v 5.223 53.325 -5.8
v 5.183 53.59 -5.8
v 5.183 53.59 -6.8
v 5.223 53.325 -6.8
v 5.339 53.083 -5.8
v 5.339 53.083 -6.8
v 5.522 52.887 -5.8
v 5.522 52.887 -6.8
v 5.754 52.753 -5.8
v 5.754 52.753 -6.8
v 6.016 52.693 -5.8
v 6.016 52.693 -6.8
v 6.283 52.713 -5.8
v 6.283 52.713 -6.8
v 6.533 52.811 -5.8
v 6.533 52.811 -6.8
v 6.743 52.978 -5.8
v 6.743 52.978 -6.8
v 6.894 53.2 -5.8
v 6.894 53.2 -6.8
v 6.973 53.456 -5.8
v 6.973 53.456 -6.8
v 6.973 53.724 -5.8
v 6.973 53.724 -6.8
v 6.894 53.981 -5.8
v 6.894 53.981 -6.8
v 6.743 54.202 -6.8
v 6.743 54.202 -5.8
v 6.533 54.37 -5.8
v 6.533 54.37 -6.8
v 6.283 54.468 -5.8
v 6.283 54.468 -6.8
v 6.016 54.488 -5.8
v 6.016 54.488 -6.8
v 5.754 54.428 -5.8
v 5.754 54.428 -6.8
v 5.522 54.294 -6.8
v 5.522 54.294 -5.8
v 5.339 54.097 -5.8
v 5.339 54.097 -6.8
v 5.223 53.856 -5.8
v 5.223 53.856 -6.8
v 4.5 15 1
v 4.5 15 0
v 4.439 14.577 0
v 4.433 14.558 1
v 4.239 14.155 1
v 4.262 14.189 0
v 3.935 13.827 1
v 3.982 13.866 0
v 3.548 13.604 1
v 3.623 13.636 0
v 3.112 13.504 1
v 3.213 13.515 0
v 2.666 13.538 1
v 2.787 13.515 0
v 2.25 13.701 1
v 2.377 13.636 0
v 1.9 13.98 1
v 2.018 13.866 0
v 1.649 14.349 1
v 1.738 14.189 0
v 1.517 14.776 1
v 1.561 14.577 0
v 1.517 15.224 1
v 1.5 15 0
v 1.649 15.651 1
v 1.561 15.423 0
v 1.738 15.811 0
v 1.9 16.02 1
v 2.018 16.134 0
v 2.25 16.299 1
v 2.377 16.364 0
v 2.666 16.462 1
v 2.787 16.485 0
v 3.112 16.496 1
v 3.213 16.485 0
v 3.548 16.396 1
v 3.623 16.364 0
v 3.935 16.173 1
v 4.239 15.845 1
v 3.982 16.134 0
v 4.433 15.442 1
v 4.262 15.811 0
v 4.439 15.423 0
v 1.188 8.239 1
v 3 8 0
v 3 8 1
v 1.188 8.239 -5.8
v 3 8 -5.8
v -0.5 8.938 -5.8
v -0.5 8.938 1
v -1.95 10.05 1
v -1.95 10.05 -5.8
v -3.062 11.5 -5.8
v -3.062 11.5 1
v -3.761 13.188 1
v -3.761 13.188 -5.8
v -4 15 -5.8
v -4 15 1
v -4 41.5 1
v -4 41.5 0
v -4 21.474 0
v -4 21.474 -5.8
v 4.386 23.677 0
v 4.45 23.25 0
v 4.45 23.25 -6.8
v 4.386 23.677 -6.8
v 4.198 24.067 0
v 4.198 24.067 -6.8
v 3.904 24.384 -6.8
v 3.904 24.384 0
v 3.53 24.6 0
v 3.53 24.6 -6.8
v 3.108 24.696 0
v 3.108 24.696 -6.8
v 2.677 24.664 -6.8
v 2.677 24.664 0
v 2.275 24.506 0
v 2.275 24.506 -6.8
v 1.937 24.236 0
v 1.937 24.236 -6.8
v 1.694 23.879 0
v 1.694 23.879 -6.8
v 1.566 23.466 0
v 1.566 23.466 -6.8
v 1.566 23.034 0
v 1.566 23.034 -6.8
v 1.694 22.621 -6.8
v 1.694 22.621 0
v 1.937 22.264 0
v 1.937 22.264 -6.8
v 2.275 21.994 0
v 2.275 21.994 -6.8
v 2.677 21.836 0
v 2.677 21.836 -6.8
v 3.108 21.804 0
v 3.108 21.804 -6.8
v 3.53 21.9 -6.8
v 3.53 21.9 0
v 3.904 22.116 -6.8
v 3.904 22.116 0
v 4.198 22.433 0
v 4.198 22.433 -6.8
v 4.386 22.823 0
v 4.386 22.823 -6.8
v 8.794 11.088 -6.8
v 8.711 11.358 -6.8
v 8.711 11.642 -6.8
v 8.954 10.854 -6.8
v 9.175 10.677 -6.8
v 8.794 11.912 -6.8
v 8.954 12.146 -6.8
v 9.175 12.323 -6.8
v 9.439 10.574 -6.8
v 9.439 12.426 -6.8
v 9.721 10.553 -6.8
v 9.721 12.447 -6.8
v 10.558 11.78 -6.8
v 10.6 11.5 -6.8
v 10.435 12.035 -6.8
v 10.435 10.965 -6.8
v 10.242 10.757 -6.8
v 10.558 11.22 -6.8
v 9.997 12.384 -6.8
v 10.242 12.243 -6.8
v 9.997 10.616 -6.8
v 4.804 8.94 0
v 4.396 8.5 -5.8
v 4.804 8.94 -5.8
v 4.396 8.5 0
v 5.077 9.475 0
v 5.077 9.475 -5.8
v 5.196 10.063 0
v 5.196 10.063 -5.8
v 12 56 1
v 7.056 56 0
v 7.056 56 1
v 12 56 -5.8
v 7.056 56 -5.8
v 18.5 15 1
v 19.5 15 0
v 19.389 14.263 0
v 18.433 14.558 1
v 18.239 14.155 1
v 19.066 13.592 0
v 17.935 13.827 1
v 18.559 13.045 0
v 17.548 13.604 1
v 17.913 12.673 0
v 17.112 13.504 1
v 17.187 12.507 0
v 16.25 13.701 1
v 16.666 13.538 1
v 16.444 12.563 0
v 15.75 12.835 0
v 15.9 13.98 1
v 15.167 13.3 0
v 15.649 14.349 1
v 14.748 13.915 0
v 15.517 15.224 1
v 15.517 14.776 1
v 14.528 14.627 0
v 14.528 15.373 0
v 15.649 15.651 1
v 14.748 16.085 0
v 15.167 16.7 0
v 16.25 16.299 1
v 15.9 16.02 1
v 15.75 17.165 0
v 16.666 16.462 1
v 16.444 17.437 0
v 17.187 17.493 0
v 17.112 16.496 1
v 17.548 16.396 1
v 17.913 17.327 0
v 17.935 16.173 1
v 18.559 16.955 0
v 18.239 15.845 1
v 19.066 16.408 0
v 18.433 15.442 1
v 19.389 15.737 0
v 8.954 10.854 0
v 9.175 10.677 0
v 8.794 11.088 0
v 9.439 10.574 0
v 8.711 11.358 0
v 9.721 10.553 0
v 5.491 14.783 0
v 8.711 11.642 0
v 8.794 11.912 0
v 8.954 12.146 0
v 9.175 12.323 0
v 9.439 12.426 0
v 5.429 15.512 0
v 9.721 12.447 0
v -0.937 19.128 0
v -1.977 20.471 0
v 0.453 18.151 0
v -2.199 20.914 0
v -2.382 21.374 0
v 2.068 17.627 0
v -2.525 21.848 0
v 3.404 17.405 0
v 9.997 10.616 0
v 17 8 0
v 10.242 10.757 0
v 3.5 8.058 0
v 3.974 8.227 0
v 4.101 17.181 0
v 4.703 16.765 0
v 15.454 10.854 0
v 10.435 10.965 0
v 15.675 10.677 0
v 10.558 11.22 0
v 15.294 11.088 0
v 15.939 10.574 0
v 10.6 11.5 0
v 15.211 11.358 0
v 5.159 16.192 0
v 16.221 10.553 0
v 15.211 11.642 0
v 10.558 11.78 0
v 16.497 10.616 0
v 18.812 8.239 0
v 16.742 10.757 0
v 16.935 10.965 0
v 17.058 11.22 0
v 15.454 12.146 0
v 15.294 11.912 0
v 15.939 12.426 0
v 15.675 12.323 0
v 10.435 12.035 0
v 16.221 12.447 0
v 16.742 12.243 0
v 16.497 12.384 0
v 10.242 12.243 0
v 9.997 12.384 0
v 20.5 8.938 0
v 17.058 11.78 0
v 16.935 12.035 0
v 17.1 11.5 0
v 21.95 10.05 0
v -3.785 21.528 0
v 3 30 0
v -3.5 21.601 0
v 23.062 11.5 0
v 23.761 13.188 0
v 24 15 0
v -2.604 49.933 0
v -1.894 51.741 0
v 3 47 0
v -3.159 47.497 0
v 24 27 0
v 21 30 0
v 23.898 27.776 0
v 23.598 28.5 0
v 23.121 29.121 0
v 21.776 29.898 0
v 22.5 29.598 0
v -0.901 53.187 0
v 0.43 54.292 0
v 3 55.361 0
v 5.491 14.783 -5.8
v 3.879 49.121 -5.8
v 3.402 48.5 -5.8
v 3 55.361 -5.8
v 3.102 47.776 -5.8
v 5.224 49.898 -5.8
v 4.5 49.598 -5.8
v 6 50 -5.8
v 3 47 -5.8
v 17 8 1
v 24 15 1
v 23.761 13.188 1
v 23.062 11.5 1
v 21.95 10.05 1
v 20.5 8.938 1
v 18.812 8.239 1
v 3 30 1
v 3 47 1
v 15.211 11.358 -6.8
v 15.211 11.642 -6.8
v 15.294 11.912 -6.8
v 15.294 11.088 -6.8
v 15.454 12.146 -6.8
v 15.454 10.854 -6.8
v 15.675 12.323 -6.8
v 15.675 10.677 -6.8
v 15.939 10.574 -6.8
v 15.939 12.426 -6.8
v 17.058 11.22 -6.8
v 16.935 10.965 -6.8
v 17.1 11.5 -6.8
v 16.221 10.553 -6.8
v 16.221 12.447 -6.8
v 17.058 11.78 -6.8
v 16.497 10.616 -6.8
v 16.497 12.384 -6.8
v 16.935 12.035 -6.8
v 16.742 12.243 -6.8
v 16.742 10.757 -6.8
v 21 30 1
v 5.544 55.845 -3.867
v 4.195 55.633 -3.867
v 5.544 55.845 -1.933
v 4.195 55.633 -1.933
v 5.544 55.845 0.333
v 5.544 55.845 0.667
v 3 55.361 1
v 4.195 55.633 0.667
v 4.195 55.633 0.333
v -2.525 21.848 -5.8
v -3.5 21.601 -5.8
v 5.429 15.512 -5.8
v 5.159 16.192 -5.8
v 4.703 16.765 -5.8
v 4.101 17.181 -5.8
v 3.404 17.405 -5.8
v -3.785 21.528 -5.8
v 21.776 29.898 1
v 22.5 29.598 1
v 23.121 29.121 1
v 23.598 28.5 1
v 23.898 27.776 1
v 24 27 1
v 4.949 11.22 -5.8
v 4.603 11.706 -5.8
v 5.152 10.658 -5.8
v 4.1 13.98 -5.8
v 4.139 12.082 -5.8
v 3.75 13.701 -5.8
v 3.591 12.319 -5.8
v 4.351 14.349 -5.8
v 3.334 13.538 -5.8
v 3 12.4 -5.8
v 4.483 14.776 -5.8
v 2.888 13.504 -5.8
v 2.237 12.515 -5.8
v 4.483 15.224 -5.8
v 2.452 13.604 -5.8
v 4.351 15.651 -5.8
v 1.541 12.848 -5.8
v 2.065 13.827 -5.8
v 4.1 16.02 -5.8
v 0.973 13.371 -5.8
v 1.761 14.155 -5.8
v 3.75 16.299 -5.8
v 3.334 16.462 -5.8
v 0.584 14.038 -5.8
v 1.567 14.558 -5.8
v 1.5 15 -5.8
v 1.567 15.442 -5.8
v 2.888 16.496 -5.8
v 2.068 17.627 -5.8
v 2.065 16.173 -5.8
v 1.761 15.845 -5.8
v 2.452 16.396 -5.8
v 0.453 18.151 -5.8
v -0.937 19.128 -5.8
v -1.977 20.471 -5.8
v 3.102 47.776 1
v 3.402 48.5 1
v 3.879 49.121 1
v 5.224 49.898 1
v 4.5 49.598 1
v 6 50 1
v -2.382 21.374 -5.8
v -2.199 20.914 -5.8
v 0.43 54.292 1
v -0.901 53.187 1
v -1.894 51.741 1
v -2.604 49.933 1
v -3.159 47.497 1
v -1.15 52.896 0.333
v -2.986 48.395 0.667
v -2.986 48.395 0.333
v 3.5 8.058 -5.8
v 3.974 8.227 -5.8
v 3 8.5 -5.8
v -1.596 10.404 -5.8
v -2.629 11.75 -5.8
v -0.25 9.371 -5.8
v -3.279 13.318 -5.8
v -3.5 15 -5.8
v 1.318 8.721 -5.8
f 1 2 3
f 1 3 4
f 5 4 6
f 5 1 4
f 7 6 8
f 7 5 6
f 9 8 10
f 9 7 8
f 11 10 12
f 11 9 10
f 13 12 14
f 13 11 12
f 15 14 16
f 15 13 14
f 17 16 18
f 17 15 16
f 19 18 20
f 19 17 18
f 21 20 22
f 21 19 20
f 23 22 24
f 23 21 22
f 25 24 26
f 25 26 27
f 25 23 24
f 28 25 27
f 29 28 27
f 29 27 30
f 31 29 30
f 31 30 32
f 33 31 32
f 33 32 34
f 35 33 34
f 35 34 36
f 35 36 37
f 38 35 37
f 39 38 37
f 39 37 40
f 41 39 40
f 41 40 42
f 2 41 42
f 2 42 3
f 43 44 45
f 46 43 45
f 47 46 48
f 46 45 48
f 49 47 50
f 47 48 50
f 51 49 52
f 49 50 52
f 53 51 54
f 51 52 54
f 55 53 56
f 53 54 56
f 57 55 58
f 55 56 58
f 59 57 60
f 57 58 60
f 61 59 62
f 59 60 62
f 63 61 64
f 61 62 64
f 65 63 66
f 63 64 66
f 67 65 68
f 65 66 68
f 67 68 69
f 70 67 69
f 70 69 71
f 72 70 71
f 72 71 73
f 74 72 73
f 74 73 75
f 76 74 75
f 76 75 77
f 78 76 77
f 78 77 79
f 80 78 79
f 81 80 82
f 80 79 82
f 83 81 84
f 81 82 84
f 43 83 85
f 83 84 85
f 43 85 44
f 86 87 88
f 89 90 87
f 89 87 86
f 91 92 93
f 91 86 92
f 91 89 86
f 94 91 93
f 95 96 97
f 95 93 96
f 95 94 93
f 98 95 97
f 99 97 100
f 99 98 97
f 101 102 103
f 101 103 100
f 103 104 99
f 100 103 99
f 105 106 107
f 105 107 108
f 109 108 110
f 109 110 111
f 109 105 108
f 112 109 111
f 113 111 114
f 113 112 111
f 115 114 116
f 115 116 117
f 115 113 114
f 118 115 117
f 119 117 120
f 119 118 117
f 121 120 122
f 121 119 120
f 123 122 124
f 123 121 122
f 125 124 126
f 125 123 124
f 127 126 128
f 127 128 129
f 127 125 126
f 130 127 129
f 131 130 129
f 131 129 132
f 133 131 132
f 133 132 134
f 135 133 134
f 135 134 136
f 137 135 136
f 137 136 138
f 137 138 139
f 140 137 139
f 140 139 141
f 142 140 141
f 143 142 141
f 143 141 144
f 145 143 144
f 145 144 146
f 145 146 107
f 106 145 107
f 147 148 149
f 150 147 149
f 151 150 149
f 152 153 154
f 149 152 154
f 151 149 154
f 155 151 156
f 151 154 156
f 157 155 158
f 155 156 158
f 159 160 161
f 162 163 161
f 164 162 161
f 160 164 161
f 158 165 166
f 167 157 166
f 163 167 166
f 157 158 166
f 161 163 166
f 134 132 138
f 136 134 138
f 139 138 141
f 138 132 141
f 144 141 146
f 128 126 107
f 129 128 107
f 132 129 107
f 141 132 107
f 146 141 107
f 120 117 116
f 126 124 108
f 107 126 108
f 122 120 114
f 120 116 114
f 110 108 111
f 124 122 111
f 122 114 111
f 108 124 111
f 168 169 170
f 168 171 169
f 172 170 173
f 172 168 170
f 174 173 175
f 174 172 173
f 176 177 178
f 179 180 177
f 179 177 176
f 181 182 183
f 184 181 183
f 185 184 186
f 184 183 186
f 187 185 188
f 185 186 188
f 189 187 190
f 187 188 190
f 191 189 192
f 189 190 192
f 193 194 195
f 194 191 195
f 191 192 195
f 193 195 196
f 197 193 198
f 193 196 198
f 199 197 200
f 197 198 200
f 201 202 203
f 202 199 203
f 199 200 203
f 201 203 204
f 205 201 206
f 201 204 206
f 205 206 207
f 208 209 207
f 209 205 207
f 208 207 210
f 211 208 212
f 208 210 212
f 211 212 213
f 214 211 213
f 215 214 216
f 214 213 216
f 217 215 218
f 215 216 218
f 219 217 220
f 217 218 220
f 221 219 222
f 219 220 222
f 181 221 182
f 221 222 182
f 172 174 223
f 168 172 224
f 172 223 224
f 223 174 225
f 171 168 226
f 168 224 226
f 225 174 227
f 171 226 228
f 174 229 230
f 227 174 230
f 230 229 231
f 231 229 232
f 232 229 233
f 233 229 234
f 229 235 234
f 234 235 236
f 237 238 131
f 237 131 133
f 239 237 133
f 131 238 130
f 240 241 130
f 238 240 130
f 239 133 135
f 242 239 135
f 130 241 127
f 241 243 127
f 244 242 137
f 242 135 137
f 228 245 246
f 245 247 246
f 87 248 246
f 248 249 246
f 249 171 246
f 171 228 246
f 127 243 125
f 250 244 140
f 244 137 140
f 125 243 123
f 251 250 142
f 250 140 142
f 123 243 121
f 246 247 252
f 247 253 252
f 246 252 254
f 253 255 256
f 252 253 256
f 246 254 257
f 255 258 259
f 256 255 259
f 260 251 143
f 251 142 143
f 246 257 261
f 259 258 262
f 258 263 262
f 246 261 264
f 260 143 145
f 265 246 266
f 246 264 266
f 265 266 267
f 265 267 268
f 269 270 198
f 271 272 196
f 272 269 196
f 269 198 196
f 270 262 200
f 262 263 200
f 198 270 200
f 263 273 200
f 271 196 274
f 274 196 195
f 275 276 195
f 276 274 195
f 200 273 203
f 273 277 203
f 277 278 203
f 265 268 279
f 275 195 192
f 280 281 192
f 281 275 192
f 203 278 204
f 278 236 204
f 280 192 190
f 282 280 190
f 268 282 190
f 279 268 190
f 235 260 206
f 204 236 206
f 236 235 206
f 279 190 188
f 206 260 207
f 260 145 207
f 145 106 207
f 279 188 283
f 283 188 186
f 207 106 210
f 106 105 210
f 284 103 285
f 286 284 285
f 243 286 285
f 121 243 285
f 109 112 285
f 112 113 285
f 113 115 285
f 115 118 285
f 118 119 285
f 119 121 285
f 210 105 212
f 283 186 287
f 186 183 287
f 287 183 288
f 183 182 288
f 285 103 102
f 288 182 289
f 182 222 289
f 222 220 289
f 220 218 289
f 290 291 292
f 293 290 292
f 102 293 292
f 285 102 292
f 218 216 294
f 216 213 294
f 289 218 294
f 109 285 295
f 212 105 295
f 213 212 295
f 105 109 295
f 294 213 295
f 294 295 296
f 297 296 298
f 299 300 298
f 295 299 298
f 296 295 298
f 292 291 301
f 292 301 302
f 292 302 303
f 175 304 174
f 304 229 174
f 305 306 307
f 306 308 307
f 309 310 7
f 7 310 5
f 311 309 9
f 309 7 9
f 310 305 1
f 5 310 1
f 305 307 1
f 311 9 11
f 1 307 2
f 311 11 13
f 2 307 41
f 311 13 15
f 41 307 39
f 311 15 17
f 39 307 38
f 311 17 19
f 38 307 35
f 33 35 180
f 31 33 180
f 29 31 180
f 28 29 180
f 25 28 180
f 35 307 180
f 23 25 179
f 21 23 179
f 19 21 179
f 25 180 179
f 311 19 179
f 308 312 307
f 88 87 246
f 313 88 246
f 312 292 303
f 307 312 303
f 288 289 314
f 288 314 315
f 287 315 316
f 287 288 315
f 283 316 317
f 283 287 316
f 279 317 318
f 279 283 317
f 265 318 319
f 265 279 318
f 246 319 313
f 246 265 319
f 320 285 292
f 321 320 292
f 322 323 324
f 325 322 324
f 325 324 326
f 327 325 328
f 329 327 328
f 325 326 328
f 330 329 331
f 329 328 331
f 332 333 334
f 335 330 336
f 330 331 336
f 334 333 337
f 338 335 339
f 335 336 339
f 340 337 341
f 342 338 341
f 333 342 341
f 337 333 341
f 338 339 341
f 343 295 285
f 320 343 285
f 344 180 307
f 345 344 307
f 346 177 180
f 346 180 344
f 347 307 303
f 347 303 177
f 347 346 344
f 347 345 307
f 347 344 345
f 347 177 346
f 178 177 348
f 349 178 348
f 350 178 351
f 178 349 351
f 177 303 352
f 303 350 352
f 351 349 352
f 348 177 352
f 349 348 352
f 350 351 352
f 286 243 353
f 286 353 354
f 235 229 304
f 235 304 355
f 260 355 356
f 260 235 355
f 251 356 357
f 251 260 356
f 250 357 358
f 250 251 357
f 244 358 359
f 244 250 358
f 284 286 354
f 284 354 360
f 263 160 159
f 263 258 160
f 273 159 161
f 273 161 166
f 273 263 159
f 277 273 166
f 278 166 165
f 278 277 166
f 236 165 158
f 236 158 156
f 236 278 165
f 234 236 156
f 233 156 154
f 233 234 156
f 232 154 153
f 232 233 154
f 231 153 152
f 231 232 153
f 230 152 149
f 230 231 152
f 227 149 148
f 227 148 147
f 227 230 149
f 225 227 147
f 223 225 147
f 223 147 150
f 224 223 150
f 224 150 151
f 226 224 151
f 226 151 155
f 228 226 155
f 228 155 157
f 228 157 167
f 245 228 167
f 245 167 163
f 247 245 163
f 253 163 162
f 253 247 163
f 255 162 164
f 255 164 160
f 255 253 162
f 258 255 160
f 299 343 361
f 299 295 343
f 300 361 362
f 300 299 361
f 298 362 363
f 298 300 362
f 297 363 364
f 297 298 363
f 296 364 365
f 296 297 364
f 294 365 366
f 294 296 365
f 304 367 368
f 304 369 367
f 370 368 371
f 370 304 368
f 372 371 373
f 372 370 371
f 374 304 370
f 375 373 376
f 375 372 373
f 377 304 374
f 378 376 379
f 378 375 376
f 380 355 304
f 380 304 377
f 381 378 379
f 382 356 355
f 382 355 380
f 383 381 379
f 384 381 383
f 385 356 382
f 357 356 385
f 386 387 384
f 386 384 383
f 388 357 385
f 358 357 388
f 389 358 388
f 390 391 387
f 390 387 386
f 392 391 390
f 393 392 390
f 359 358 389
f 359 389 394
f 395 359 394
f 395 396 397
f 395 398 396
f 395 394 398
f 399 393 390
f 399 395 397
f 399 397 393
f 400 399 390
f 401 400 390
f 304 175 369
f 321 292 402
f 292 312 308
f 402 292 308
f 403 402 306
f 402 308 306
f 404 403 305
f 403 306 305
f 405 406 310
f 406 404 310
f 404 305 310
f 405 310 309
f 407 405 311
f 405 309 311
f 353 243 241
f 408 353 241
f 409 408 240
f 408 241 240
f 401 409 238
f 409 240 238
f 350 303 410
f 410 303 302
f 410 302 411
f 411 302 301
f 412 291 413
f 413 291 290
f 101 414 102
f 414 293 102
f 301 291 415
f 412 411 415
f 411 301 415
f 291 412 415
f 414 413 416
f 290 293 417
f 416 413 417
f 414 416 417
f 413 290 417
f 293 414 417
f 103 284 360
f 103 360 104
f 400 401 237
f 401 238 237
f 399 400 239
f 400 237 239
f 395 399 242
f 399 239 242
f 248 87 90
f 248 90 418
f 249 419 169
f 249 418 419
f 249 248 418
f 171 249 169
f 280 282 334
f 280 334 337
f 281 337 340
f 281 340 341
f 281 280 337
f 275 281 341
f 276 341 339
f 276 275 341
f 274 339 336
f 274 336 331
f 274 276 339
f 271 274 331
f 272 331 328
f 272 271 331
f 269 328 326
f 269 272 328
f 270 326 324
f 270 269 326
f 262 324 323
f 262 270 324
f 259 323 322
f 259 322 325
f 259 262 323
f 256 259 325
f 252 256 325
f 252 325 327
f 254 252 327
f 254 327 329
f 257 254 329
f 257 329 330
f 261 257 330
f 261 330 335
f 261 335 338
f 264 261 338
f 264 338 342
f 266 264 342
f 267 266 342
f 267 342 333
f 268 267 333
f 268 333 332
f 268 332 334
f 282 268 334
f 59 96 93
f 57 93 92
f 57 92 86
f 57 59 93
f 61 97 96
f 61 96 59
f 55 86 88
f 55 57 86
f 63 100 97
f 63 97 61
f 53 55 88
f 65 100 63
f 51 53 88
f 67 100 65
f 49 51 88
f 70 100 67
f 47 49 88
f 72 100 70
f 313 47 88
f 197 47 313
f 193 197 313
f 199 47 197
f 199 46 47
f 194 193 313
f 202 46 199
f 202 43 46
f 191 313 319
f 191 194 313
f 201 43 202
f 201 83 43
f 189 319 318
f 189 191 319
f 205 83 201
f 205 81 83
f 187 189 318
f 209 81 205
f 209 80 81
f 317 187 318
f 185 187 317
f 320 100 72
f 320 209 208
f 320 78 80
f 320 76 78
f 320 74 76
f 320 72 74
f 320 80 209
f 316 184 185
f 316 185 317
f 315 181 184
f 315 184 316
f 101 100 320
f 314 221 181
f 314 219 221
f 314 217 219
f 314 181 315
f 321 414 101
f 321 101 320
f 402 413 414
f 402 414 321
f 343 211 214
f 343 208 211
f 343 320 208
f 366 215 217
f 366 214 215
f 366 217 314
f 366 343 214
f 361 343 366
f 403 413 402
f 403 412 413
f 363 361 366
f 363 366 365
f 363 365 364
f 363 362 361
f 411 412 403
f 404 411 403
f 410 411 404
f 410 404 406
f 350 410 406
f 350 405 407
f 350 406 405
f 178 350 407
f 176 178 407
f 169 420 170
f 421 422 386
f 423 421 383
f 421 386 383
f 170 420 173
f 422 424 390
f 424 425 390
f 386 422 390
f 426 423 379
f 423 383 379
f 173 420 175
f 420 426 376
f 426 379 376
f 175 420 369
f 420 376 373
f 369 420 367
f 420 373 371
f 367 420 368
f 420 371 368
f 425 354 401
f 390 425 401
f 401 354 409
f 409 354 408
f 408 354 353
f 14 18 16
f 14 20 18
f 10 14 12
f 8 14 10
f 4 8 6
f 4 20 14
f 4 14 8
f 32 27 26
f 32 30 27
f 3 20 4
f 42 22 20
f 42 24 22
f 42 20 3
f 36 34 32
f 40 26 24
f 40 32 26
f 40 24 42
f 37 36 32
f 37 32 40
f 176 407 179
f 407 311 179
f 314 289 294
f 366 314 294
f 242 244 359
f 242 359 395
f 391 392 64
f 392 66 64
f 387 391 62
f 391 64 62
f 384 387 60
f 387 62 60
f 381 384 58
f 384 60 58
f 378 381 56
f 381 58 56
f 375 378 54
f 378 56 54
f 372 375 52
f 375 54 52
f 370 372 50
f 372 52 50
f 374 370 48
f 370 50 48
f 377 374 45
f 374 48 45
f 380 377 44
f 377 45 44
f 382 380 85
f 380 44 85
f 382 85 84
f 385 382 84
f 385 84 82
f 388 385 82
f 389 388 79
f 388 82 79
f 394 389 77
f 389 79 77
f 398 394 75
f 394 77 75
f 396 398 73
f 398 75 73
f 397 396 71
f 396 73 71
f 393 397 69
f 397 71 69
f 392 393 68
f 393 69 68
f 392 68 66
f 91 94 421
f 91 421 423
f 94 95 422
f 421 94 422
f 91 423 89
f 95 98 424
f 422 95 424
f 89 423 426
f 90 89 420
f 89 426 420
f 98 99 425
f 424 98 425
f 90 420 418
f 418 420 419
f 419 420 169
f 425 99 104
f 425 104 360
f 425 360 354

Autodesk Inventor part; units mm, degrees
ref_plane "YZ Plane" through (0, 0, 0) normal (1, 0, 0) x (0, 1, 0)
sketch "Эскиз1" plane through (0, 0, 0) normal (0, 0, 1) x (1, 0, 0)
  line L0 (177.53, 10) -> (177.53, -9.022) projected
  line L1 (177.53, -9.022) -> (165.53, -9.022) projected
  line L2 (165.53, -9.022) -> (165.53, 10) projected
  line L3 (165.53, 10) -> (177.53, 10) projected
  line L4 (165.53, -76) -> (165.53, -56.978) projected
  line L5 (165.53, -56.978) -> (177.53, -56.978) projected
  line L6 (177.53, -56.978) -> (177.53, -76) projected
  line L7 (177.53, -76) -> (165.53, -76) projected
  circle A0 centre (170.53, -49.23) radius 1.6 projected
  circle A1 centre (170.53, -16.77) radius 1.6 projected
  line L8 (181.53, -107.5) -> (181.53, 41.5) projected
  spline S0 degree 3 poles (170.4742, 56) (180.336, 55.2175) (180.2172, 51.2995) (181.53, 41.5) knots -0.786777 -0.786777 -0.786777 -0.786777 0 0 0 0 projected
  line L9 (7.0558, 56) -> (170.4742, 56) projected
  spline S1 degree 3 poles (7.0558, 56) (-2.806, 55.2175) (-2.6872, 51.2995) (-4, 41.5) knots -0.786777 -0.786777 -0.786777 -0.786777 0 0 0 0 projected
  line L10 (-4, 41.5) -> (-4, -107.5) projected
  spline S2 degree 3 poles (7.0558, -122) (-2.806, -121.2175) (-2.6872, -117.2995) (-4, -107.5) knots -0.786777 -0.786777 -0.786777 -0.786777 0 0 0 0 projected
  line L11 (170.4742, -122) -> (7.0558, -122) projected
  spline S3 degree 3 poles (170.4742, -122) (180.336, -121.2175) (180.2172, -117.2995) (181.53, -107.5) knots -0.786777 -0.786777 -0.786777 -0.786777 0 0 0 0 projected
  arc A2 (153.53, -93) -> (156.53, -96) centre (156.53, -93) ccw projected
  line L12 (156.53, -96) -> (174.53, -96) projected
  line L13 (174.53, -96) -> (174.53, -113) projected
  arc A3 (171.53, -116) -> (174.53, -113) centre (171.53, -113) ccw projected
  line L14 (171.53, -116) -> (6, -116) projected
  arc A4 (3, -113) -> (6, -116) centre (6, -113) ccw projected
  line L15 (3, -113) -> (3, -96) projected
  line L16 (3, -96) -> (21, -96) projected
  arc A5 (21, -96) -> (24, -93) centre (21, -93) ccw projected
  line L17 (24, -93) -> (24, 27) projected
  arc A6 (24, 27) -> (21, 30) centre (21, 27) ccw projected
  line L18 (21, 30) -> (3, 30) projected
  line L19 (3, 30) -> (3, 47) projected
  arc A7 (6, 50) -> (3, 47) centre (6, 47) ccw projected
  line L20 (6, 50) -> (171.53, 50) projected
  arc A8 (174.53, 47) -> (171.53, 50) centre (171.53, 47) ccw projected
  line L21 (174.53, 30) -> (174.53, 47) projected
  line L22 (174.53, 30) -> (156.53, 30) projected
  arc A9 (156.53, 30) -> (153.53, 27) centre (156.53, 27) ccw projected
  line L23 (153.53, 27) -> (153.53, -93) projected
  circle A10 centre (160.53, -81) radius 1.5 projected
  circle A11 centre (17, -81) radius 1.5 projected
  circle A12 centre (17, -51) radius 1.5 projected
  circle A13 centre (160.53, -51) radius 1.5 projected
  circle A14 centre (3, -81) radius 1.5 projected
  circle A15 centre (3, -51) radius 1.5 projected
  circle A16 centre (174.53, -81) radius 1.5 projected
  circle A17 centre (17, 15) radius 1.5 projected
  circle A18 centre (17, -15) radius 1.5 projected
  circle A19 centre (160.53, -15) radius 1.5 projected
  circle A20 centre (160.53, 15) radius 1.5 projected
  circle A21 centre (3, 15) radius 1.5 projected
  circle A22 centre (174.53, 15) radius 1.5 projected
  circle A23 centre (3, -15) radius 1.5 projected
  arc A24 (56.8183, -29.5099) -> (58.485, -27.5378) centre (56.485, -27.5378) ccw projected
  line L24 (58.485, -27.5378) -> (58.485, 14) projected
  arc A25 (61.485, 17) -> (58.485, 14) centre (61.485, 14) ccw projected
  line L25 (61.485, 17) -> (61.97, 17) projected
  arc A26 (61.97, 17) -> (64.97, 20) centre (61.97, 20) ccw projected
  line L26 (64.97, 27) -> (64.97, 20) projected
  arc A27 (64.97, 27) -> (61.97, 30) centre (61.97, 27) ccw projected
  line L27 (9.6271, 30) -> (61.97, 30) projected
  arc A28 (9.6271, 30) -> (-1.03, 20.7602) centre (9.8286, 19.0018) ccw projected
  line L28 (-1.03, 20.7602) -> (-1.03, 11.499) projected
  arc A29 (-1.03, 11.499) -> (0.1129, 8.6996) centre (2.97, 11.499) ccw projected
  arc A30 (0.97, 6.6) -> (0.1129, 8.6996) centre (-2.03, 6.6) ccw projected
  line L29 (0.97, 6.6) -> (0.97, -72.6) projected
  arc A31 (0.1129, -74.6996) -> (0.97, -72.6) centre (-2.03, -72.6) ccw projected
  arc A32 (0.1129, -74.6996) -> (-1.03, -77.499) centre (2.97, -77.499) ccw projected
  line L30 (-1.03, -77.499) -> (-1.03, -86.7602) projected
  arc A33 (-1.03, -86.7602) -> (9.6271, -96) centre (9.8286, -85.0018) ccw projected
  line L31 (61.97, -96) -> (9.6271, -96) projected
  arc A34 (61.97, -96) -> (64.97, -93) centre (61.97, -93) ccw projected
  line L32 (64.97, -86) -> (64.97, -93) projected
  arc A35 (64.97, -86) -> (61.97, -83) centre (61.97, -86) ccw projected
  line L33 (61.97, -83) -> (61.485, -83) projected
  arc A36 (58.485, -80) -> (61.485, -83) centre (61.485, -80) ccw projected
  line L34 (58.485, -80) -> (58.485, -48.5022) projected
  arc A37 (58.485, -48.5022) -> (56.8183, -46.5301) centre (56.485, -48.5022) ccw projected
  arc A38 (53.485, -45.3303) -> (56.8183, -46.5301) centre (58.485, -36.67) ccw projected
  arc A39 (52.485, -43.5982) -> (53.485, -45.3303) centre (54.485, -43.5982) ccw projected
  line L35 (52.485, -43.5982) -> (52.485, -32.4418) projected
  arc A40 (53.485, -30.7097) -> (52.485, -32.4418) centre (54.485, -32.4418) ccw projected
  arc A41 (56.8183, -29.5099) -> (53.485, -30.7097) centre (58.485, -39.37) ccw projected
  circle A42 centre (3, -81) radius 1.5 projected
  circle A43 centre (3, 15) radius 1.5 projected
  circle A44 centre (58.485, -89.515) radius 1.5 projected
  circle A45 centre (17, -51) radius 1.5 projected
  circle A46 centre (17, -15) radius 1.5 projected
  circle A47 centre (58.485, 23.515) radius 1.5 projected
  circle A48 centre (49.485, 22.73) radius 0.325 projected
  circle A49 centre (48.885, -25.77) radius 0.8 projected
  circle A50 centre (49.385, -32.52) radius 0.5 projected
  circle A51 centre (4.27, -36.27) radius 0.325 projected
  circle A52 centre (28.2, -73.38) radius 0.325 projected
  circle A53 centre (12.77, 15) radius 0.325 projected
  circle A54 centre (55.185, -49.79) radius 0.325 projected
  circle A55 centre (55.185, -4.51) radius 0.325 projected
  circle A56 centre (12.77, 22) radius 0.325 projected
  circle A57 centre (12.77, -88) radius 0.325 projected
  circle A58 centre (4.27, -23.42) radius 0.325 projected
  circle A59 centre (39.385, -40.52) radius 0.85 projected
  circle A60 centre (53.885, -25.77) radius 0.8 projected
  circle A61 centre (8.77, -88) radius 0.325 projected
  circle A62 centre (39.385, -35.52) radius 0.85 projected
  circle A63 centre (28.2, -60.76) radius 0.325 projected
  circle A64 centre (4.27, -47) radius 0.325 projected
  circle A65 centre (45.215, -90) radius 0.325 projected
  circle A66 centre (43.485, 24.73) radius 0.5 projected
  circle A67 centre (55.185, -69.03) radius 0.325 projected
  circle A68 centre (55.185, 15.73) radius 0.325 projected
  circle A69 centre (45.215, -83) radius 0.325 projected
  circle A70 centre (12.77, -81) radius 0.325 projected
  circle A71 centre (4.27, -8.84) radius 0.325 projected
  circle A72 centre (49.385, -43.52) radius 0.5 projected
  circle A73 centre (8.77, 22) radius 0.325 projected
  line L36 (6, 50) -> (12, 56)
  line L37 (3, 47) -> (3, 55.3611)
  circle A74 centre (3, 15) radius 7
  circle A75 centre (17, 15) radius 7
  line L38 (3, 8) -> (17, 8)
  circle A76 centre (3, 15) radius 2.6
  line L39 (3, 17.6) -> (24, 17.6)
  line L40 (5.6, 15) -> (7.6, 15)
  line L41 (7.6, 15) -> (7.6, 17.6)
  line L42 (7.6, 15) -> (7.6, 8)
  line L43 (7.6, 17.6) -> (20.4, 17.6)
  line L44 (20.4, 17.6) -> (20.4, 7.6)
  line L45 (20.4, 7.6) -> (7.6, 7.6)
  line L46 (7.6, 7.6) -> (7.6, 17.6)
  point P0 (0, 0)
  point P1 (23.4992, 17.6)
  point P2 (-4, 15)
  point P3 (10.5008, 17.6)
  point P4 (10, 15)
  point P5 (9.4992, 17.6)
  point P6 (24, 15)
  dimension "d8" = 5.2
  dimension "d15" = 2
  dimension "d16" = 12.8
  dimension "d17" = 10
extrude "Выдавливание1" add sketch "Эскиз1" along normal blind 1 contours L36 A7 L37 S1 L9 | L10 S1 L37 L19 L18 A28 L28 A74 | A74 L28 A29 A30 | A74 L39 A76 L40 L42 A30 A29 L28 | L28 A28 L18 A6 L17 L39 A75 A74 | L39 A75 A74 | A74 L42 L41 L39 | A74 L42 L38 | A75 L38 L42 A74 | A75 L39 L44 | L41 L40 A76 L39 | A75 L39 | A76 | L39 L17 A75 | A75 L44 L39 | A53 | A56 | A73
chamfer "Фаска1" distance 1 angle 45 1 edges at (15.5, 15, 0)
sketch "Эскиз2" plane through (0, 0, 1) normal (0, 0, 1) x (1, 0, 0)
  circle A0 centre (3, 15) radius 1.5 projected
  line L0 (24, 15) -> (24, 27) projected
  arc A1 (24, 27) -> (21, 30) centre (21, 27) ccw projected
  line L1 (21, 30) -> (3, 30) projected
  line L2 (3, 30) -> (3, 47) projected
  arc A2 (6, 50) -> (3, 47) centre (6, 47) ccw projected
  line L3 (6, 50) -> (12, 56) projected
  line L4 (12, 56) -> (7.0558, 56) projected
  line L5 (-4, 41.5) -> (-4, 15) projected
  arc A3 (-4, 15) -> (3, 8) centre (3, 15) ccw projected
  line L6 (3, 8) -> (17, 8) projected
  arc A4 (17, 8) -> (24, 15) centre (17, 15) ccw projected
  line L7 (3, 30) -> (3, 47) projected
  line L8 (3, 47) -> (3, 55.3611)
  arc A5 (6, 50) -> (3, 47) centre (6, 47) ccw projected
  circle A6 centre (3, 15) radius 1.5 projected
  line L9 (4.5, 15) -> (6.5, 15)
  line L10 (6.5, 15) -> (6.5, 16.5)
  line L11 (6.5, 16.5) -> (3, 16.5)
  line L12 (21, 30) -> (3, 30) projected
  line L13 (3, 16.5) -> (3, 30)
  circle A7 centre (3, 23.25) radius 1.6
  line L14 (6.5, 16.5) -> (19.3, 16.5)
  line L15 (19.3, 16.5) -> (19.3, 6.4)
  line L16 (19.3, 6.4) -> (6.5, 6.4)
  line L17 (6.5, 6.4) -> (6.5, 16.5)
  line L18 (19.3, 16.5) -> (19.3, 10)
  line L19 (19.3, 10) -> (19.3, 11.5)
  line L20 (19.3, 11.5) -> (6.5, 11.5)
  line L21 (12.9, 11.5) -> (16.15, 11.5)
  line L22 (16.15, 11.5) -> (9.65, 11.5)
  circle A8 centre (9.65, 11.5) radius 1
  circle A9 centre (16.15, 11.5) radius 1
  line L23 (19.3, 10) -> (6.5, 10)
  line L24 (9.65, 11.5) -> (18.15, 11.5)
  line L25 (18.172, 17.2) -> (6.5, 16.5)
  line L26 (17.4875, 20.5) -> (6.5, 16.5)
  arc A10 (18.1929, 16.5) -> (17.4875, 20.5) centre (6.5, 16.5) ccw
  line L27 (6.5, 16.5) -> (6.5, 16.7)
  line L28 (8.0036, 17.7621) -> (19.1448, 21.3116)
  circle A11 centre (3, 15) radius 2.6
  circle A12 centre (3, 23.25) radius 5.5
  line L29 (8.0036, 17.7621) -> (5.1102, 17.8522)
  line L30 (2.8349, 17.7525) -> (3.7176, 17.499)
  circle A13 centre (3, 23.25) radius 16.2607
  line L31 (6.5, 16.7) -> (18.172, 17.4)
  line L32 (6.5, 16.7) -> (3.7176, 17.499)
  line L33 (4.1923, 17.8808) -> (5.1102, 17.8522)
  line L34 (17.7935, 30) -> (3, 23.25)
  line L35 (3, 23.25) -> (18.9993, 26.1538)
  line L36 (21, 30) -> (3, 30) projected
  line L37 (18.9993, 26.1538) -> (8.3735, 28.8503)
  line L38 (18.9993, 26.1538) -> (3.8431, 30)
  circle A14 centre (3, 23.25) radius 6.75
  point P0 (0, 0)
  dimension "d41" = 11
  dimension "d23" = 2
  dimension "d24" = 3.2
  dimension "d25" = 12.8
  dimension "d26" = 10.1
  dimension "d27" = 6.5
  dimension "d28" = 1.5
  dimension "d29" = 3.25
  dimension "d30" = 6.5
  dimension "d31" = 2
  dimension "d32" = 2
  dimension "d35" = 8.5
  dimension "d39" = 0.2
  dimension "d40" = 5.2
  dimension "d42" = 16.572
  dimension "d44" = 14.239
  dimension "d45" = 24.526
  dimension "d48" = 24.526
sketch "Эскиз3" plane through (0, 0, 1) normal (0, 0, 1) x (1, 0, 0)
  arc A0 (-2.5, 23.25) -> (3, 17.75) centre (3, 23.25) ccw projected
  line L0 (3, 17.75) -> (3, 17.7051) projected
  line L1 (3, 17.7051) -> (6.5, 16.7) projected
  line L2 (6.5, 16.7) -> (18.172, 17.4) projected
  arc A1 (18.172, 17.4) -> (18.9993, 26.1538) centre (3, 23.25) ccw projected
  line L3 (18.9993, 26.1538) -> (4.6603, 29.7926) projected
  arc A2 (4.6603, 29.7926) -> (3, 30) centre (3, 23.25) ccw projected
  line L4 (3, 30) -> (3, 55.3611) projected
  spline S0 degree 3 poles (3, 55.3611) (-2.8051, 53.7936) (-2.8999, 49.7118) (-4, 41.5) knots -0.659309 -0.659309 -0.659309 -0.659309 0 0 0 0 projected
  line L5 (-4, 41.5) -> (-4, 23.25) projected
  line L6 (-4, 23.25) -> (-2.5, 23.25) projected
  circle A3 centre (3, 23.25) radius 1.6 projected
  line L7 (-2.331, 21.8972) -> (-3.7849, 21.5282)
  line L8 (-4, 41.5) -> (-4, 15) projected
  line L9 (-2.331, 21.8972) -> (-4, 21.4736)
  line L10 (-2.331, 21.8972) -> (-2.5249, 21.848)
  circle A4 centre (3, 23.25) radius 5.7
  circle A5 centre (3, 15) radius 2.6 projected
  line L11 (-2.5249, 21.848) -> (0.5844, 14.0383)
  arc A6 (-4, 15) -> (3, 8) centre (3, 15) ccw projected
  line L12 (3, 12.4) -> (3, 8)
  circle A7 centre (3, 10.2) radius 2.2
  line L13 (3, 30) -> (3, 55.3611) projected
  circle A8 centre (3, 15) radius 1.5 projected
  line L14 (24, 15) -> (24, 27) projected
  arc A9 (24, 27) -> (21, 30) centre (21, 27) ccw projected
  line L15 (21, 30) -> (3, 30) projected
  line L16 (3, 30) -> (3, 47) projected
  arc A10 (6, 50) -> (3, 47) centre (6, 47) ccw projected
  line L17 (6, 50) -> (12, 56) projected
  line L18 (12, 56) -> (7.0558, 56) projected
  spline S1 degree 3 poles (7.0558, 56) (-2.806, 55.2175) (-2.6872, 51.2995) (-4, 41.5) knots 0 0 0 0 1 1 1 1 projected
  line L19 (-4, 41.5) -> (-4, 15) projected
  arc A11 (-4, 15) -> (3, 8) centre (3, 15) ccw projected
  line L20 (3, 8) -> (17, 8) projected
  arc A12 (17, 8) -> (24, 15) centre (17, 15) ccw projected
  point P0 (0, 0)
  point P1 (-1.9767, 20.471)
  point P2 (-2.7, 23.25)
  point P3 (3, 8)
  dimension "d49" = 0.2
extrude "Выдавливание2" add sketch "Эскиз3" against normal blind 6.8 contours A4 L11 A5 A7 A6 L8 L9 L7 | S1 L18 L17 A10 L4 | A7 L12 | L12 A7
ref_plane "РабПлоскость3" through (-3.5074, 8.5, -6.8) normal (0, 0, -1) x (0, 1, 0)
sketch "Эскиз4" plane through (0, 0, 1) normal (0, 0, 1) x (1, 0, 0)
  line L0 (3, 8) -> (17, 8) projected
  arc A0 (17, 8) -> (24, 15) centre (17, 15) ccw projected
  line L1 (24, 15) -> (24, 27) projected
  arc A1 (24, 27) -> (21, 30) centre (21, 27) ccw projected
  line L2 (21, 30) -> (3, 30) projected
  line L3 (3, 30) -> (3, 47) projected
  line L4 (-4, 41.5) -> (-4, 15) projected
  circle A2 centre (3, 15) radius 1.5 projected
  circle A3 centre (3, 23.25) radius 1.6 projected
  circle A4 centre (3, 23.25) radius 1.6
  arc A5 (-4, 15) -> (3, 8) centre (3, 15) ccw projected
  arc A6 (6, 50) -> (3, 47) centre (6, 47) ccw projected
  line L5 (6, 50) -> (12, 56) projected
  line L6 (12, 56) -> (7.0558, 56) projected
  circle A7 centre (3, 23.25) radius 1.45
  point P0 (0, 0)
  dimension "d59" = 2.9
extrude "Выдавливание3" add sketch "Эскиз4" against normal up to surface (7.8 mm away) contours A7
ref_plane "РабПлоскость1" through (10, -98, 1) normal (0, 0, 1) x (-1, 0, 0)
sketch "Эскиз5" plane through (0, 0, 1) normal (0, 0, 1) x (1, 0, 0)
  circle A0 centre (16.15, 11.5) radius 1 projected
  circle A1 centre (9.65, 11.5) radius 1 projected
  circle A2 centre (16.15, 11.5) radius 0.95
  circle A3 centre (9.65, 11.5) radius 0.95
  point P0 (0, 0)
  dimension "d55" = 1.9
  dimension "d56" = 1.9
ref_plane "РабПлоскость2" through (-3.5074, 8.5, -6.8) normal (0, 0, -1) x (0, 1, 0)
extrude "Выдавливание4" add sketch "Эскиз5" against normal up to surface (7.8 mm away) contours A2 | A3
sketch "Эскиз6" plane through (0, 0, -5.8) normal (0, 0, -1) x (-1, 0, 0)
  line L0 (-3, 55.3611) -> (-3, 47) projected
  line L1 (-3, 47) -> (-3, 55.3611)
  line L2 (-3, 51.1805) -> (-9.1658, 56)
  line L3 (-7.0558, 56) -> (-12, 56) projected
  circle A0 centre (-6.0829, 53.5903) radius 0.9
  point P0 (0, 0)
  point P1 (-3, 48.8974)
  point P2 (-11.2757, 56)
  dimension "d60" = 1.8
extrude "Выдавливание5" add sketch "Эскиз6" along normal blind 1
sketch "Эскиз7" plane through (0, 0, 0) normal (0, 0, -1) x (-1, 0, 0)
  circle A0 centre (-3, 23.25) radius 1.45 projected
  arc A1 (1.9767, 20.471) -> (2.5249, 21.848) centre (-3, 23.25) ccw projected
  circle A2 centre (-3, 23.25) radius 5.7
  circle A3 centre (-2.9956, 14.939) radius 2.5
  circle A4 centre (-6.0829, 53.5903) radius 1 projected
  circle A5 centre (-9.65, 11.5) radius 1 projected
  circle A6 centre (-16.15, 11.5) radius 1 projected
  circle A7 centre (-3, 15) radius 1.5 projected
  spline S0 degree 3 poles (-11.8813, 55.8813) (-11.5826, 55.8576) (-11.2839, 55.8339) (-9.6886, 55.7073) (-8.392, 55.6044) (-7.0954, 55.5016) (-6.4276, 55.4486) (-5.761, 55.378) (-4.436, 55.18) (-3.7771, 55.053) (-3.1303, 54.8784) knots -0.480098 -0.480098 -0.480098 -0.480098 -0.390203 -0.390203 0 0 0 0.200965 0.200965 0.401929 0.401929 0.401929 0.401929 projected
  line L0 (-6, 50) -> (-11.8813, 55.8813) projected
  arc A8 (-3, 47) -> (-6, 50) centre (-6, 47) ccw projected
  line L1 (-3, 29.5) -> (-3, 47) projected
  line L2 (-21, 29.5) -> (-3, 29.5) projected
  arc A9 (-21, 29.5) -> (-23.5, 27) centre (-21, 27) ccw projected
  line L3 (-23.5, 15) -> (-23.5, 27) projected
  arc A10 (-23.5, 15) -> (-17, 8.5) centre (-17, 15) ccw projected
  line L4 (-3, 8.5) -> (-17, 8.5) projected
  arc A11 (-3, 8.5) -> (3.5, 15) centre (-3, 15) ccw projected
  line L5 (3.5, 41.4667) -> (3.5, 15) projected
  spline S1 degree 3 poles (-3.1303, 54.8784) (-2.6291, 54.743) (-2.1362, 54.5792) (-0.9005, 54.0408) (-0.1868, 53.5905) (0.8903, 52.4892) (1.2826, 51.883) (1.8703, 50.6272) (2.0813, 49.9831) (2.4991, 48.4014) (2.6686, 47.4532) (2.9735, 45.5011) (3.1042, 44.4955) (3.3227, 42.8153) (3.4098, 42.1408) (3.5, 41.4667) knots 0 0 0 0 0.155758 0.155758 0.404215 0.404215 0.617746 0.617746 0.82024 0.82024 1.108518 1.108518 1.413208 1.413208 1.61725 1.61725 1.61725 1.61725 projected
  circle A12 centre (-3, 23.25) radius 1.6 projected
  arc A13 (-3, 12.4) -> (-3, 8) centre (-3, 10.2) ccw projected
  line L6 (1.9767, 20.471) -> (-0.5844, 14.0383) projected
  line L7 (4, 21.4736) -> (2.5249, 21.848) projected
  circle A14 centre (-6.0829, 53.5903) radius 1 projected
  circle A15 centre (-9.65, 11.5) radius 1 projected
  circle A16 centre (-16.15, 11.5) radius 1 projected
  circle A17 centre (-3, 15) radius 1.5 projected
  spline S2 degree 3 poles (-11.8813, 55.8813) (-11.5826, 55.8576) (-11.2839, 55.8339) (-9.6886, 55.7073) (-8.392, 55.6044) (-7.0954, 55.5016) (-6.4276, 55.4486) (-5.761, 55.378) (-4.436, 55.18) (-3.7771, 55.053) (-3.1303, 54.8784) knots -0.480098 -0.480098 -0.480098 -0.480098 -0.390203 -0.390203 0 0 0 0.200965 0.200965 0.401929 0.401929 0.401929 0.401929 projected
  line L8 (-6, 50) -> (-11.8813, 55.8813) projected
  arc A18 (-3, 47) -> (-6, 50) centre (-6, 47) ccw projected
  line L9 (-3, 29.5) -> (-3, 47) projected
  line L10 (-21, 29.5) -> (-3, 29.5) projected
  arc A19 (-21, 29.5) -> (-23.5, 27) centre (-21, 27) ccw projected
  line L11 (-23.5, 15) -> (-23.5, 27) projected
  arc A20 (-23.5, 15) -> (-17, 8.5) centre (-17, 15) ccw projected
  line L12 (-3, 8.5) -> (-17, 8.5) projected
  arc A21 (-3, 8.5) -> (3.5, 15) centre (-3, 15) ccw projected
  line L13 (3.5, 41.4667) -> (3.5, 15) projected
  spline S3 degree 3 poles (-3.1303, 54.8784) (-2.6291, 54.743) (-2.1362, 54.5792) (-0.9005, 54.0408) (-0.1868, 53.5905) (0.8903, 52.4892) (1.2826, 51.883) (1.8703, 50.6272) (2.0813, 49.9831) (2.4991, 48.4014) (2.6686, 47.4532) (2.9735, 45.5011) (3.1042, 44.4955) (3.3227, 42.8153) (3.4098, 42.1408) (3.5, 41.4667) knots 0 0 0 0 0.155758 0.155758 0.404215 0.404215 0.617746 0.617746 0.82024 0.82024 1.108518 1.108518 1.413208 1.413208 1.61725 1.61725 1.61725 1.61725 projected
  circle A22 centre (-3, 23.25) radius 1.6 projected
  line L14 (-5.4907, 14.783) -> (-5.1957, 10.0628)
  arc A23 (-3, 12.4) -> (-3, 8) centre (-3, 10.2) ccw projected
  line L15 (-3.4042, 17.4054) -> (-2.0685, 17.6266)
  point P0 (0, 0)
  point P1 (-4.3964, 8.5)
  point P2 (3.5, 21.6005)
  dimension "d63" = 5
extrude "Выдавливание6" add sketch "Эскиз7" along normal blind 5.8 contours A1 L7 L5 A11 L4 A13 L14 A3 L15 A2 | A3
properties part number "end carp right"
